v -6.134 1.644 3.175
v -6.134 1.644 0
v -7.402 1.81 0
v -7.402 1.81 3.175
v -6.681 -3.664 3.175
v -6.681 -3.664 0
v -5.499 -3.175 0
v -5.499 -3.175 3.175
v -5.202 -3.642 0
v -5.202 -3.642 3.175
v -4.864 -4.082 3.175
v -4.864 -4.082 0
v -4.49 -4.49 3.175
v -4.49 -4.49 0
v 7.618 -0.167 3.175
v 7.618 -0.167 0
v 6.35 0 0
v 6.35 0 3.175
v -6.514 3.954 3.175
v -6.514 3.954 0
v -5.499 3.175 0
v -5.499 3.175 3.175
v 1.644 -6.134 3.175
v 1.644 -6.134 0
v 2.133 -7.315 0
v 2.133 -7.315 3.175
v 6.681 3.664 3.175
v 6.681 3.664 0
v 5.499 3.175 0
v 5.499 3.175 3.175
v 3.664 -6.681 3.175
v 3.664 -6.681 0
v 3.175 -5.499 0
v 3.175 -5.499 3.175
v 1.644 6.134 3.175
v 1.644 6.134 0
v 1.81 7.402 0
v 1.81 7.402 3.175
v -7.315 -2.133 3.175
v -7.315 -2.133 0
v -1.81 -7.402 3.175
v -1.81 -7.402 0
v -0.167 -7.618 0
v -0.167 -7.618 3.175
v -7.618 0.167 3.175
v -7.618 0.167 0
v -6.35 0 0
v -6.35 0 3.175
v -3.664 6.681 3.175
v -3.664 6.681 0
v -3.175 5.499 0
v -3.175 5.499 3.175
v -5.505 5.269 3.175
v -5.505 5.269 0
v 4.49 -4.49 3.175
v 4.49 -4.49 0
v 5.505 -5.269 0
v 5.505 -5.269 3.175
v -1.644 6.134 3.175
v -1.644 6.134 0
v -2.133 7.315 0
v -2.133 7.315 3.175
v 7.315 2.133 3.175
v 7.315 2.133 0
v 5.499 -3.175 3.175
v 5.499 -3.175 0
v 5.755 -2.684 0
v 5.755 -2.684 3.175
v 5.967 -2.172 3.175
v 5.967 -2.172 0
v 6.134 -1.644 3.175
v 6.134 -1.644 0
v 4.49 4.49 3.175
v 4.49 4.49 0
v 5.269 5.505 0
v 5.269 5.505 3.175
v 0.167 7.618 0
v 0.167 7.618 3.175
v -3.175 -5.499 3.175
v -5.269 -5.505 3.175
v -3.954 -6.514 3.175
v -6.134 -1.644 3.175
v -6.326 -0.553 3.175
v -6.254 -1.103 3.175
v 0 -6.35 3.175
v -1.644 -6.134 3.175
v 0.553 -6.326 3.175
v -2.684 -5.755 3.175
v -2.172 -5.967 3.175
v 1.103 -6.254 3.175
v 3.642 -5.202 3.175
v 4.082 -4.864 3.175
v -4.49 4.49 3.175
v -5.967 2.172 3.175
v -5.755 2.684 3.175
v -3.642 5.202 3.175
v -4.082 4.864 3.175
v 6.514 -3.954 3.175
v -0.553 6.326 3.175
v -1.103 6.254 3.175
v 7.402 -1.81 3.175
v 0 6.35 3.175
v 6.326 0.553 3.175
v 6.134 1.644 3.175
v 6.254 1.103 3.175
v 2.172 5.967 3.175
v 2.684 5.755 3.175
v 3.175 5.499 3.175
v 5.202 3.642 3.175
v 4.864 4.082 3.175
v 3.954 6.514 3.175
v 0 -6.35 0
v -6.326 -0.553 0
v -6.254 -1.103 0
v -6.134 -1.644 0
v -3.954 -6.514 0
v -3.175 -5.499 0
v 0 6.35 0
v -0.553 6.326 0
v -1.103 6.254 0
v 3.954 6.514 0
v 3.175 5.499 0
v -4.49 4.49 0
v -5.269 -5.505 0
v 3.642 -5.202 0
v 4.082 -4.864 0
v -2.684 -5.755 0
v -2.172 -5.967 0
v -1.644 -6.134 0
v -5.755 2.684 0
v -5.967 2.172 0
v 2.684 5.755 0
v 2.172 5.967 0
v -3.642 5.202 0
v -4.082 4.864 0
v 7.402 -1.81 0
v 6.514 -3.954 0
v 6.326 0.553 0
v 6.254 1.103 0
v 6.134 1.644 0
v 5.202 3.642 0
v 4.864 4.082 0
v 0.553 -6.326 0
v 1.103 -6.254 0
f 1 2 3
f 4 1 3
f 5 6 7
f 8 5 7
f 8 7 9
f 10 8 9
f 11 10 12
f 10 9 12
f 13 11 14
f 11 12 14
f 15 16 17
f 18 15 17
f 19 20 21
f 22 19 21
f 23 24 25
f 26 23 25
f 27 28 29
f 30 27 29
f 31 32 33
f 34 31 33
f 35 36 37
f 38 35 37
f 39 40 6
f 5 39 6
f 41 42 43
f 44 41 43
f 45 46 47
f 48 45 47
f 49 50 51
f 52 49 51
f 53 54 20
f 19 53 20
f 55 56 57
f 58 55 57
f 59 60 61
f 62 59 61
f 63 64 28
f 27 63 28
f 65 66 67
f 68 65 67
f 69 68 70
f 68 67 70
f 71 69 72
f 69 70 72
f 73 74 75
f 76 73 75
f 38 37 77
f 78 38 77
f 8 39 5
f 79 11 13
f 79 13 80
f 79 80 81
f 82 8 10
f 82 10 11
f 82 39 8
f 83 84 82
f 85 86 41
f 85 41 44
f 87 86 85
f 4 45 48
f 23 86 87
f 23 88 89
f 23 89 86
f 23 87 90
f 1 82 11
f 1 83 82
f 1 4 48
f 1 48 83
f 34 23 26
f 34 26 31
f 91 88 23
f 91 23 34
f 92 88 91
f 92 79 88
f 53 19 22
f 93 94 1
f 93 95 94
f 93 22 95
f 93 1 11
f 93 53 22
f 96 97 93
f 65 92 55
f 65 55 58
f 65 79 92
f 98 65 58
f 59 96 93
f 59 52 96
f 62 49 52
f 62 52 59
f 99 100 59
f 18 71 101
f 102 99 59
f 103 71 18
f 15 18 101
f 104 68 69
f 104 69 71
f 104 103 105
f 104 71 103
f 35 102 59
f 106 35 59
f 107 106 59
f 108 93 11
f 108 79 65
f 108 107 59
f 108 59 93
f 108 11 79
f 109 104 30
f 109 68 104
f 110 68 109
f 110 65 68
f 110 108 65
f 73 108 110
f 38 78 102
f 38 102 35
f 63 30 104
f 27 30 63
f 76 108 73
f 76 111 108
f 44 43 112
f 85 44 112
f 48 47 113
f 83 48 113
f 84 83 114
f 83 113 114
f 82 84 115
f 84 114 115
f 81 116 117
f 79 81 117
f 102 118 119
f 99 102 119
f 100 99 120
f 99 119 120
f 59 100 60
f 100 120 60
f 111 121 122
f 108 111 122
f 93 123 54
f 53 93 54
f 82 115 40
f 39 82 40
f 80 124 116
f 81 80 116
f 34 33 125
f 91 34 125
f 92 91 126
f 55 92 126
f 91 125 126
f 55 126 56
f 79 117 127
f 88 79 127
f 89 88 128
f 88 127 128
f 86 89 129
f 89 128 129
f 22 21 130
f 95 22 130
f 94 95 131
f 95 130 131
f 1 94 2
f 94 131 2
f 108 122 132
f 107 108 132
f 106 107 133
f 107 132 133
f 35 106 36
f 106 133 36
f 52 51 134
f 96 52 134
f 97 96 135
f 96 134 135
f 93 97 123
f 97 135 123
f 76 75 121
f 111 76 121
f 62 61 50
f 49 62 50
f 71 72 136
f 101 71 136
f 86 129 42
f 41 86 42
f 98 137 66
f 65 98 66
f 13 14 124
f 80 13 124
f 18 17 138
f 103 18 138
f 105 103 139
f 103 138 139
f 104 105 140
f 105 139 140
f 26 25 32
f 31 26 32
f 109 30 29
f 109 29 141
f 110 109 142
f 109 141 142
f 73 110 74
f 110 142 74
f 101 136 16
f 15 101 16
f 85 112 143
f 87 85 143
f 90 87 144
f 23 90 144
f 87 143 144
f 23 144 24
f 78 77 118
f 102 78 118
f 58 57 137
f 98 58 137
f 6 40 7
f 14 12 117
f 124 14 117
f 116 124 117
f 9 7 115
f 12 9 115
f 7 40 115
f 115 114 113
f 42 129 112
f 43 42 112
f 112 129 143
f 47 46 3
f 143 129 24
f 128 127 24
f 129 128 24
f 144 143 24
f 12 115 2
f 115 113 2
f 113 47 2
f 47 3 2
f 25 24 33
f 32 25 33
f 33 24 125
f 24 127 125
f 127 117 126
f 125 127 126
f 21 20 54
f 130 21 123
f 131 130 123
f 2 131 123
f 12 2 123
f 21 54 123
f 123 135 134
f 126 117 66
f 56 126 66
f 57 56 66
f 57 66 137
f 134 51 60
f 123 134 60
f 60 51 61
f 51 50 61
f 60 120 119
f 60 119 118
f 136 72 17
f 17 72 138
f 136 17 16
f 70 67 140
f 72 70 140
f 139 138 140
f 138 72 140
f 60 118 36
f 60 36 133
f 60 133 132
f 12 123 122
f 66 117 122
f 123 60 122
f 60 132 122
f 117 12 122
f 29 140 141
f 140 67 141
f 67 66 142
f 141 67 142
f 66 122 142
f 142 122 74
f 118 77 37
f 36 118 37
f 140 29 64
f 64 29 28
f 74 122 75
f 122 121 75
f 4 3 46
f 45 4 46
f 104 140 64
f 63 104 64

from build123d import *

# Parameters (mm, degrees)
F1_DEPTH = 3.175
F2_COUNT = 12


# Not quite as in the source:
# - a length typed as a fraction of an inch, garbled in the dataset ("3 / 203.2 mm" for 3/8 in), is restored


with BuildPart() as f1:
    # F0 (on Top) → F1 (new body)
    with BuildSketch(Plane.XY):
        with BuildLine():
            ThreePointArc((0, 6.35), (-4.4901280605, -4.4901280605), (6.35, 0))
            ThreePointArc((6.35, 0), (5.0377937108, 3.8656350742), (1.6435009364, 6.1336289969))
            ThreePointArc((1.6435009364, 6.1336289969), (0.8288413206, 6.2956748697), (0, 6.35))
        make_face()
        with BuildLine():
            ThreePointArc((0, 6.35), (0.8288413206, 6.2956748697), (1.6435009364, 6.1336289969))
            Line((1.6435009364, 6.1336289969), (1.8104587787, 7.4017997143))
            Line((1.8104587787, 7.4017997143), (0.1669578423, 7.6181707174))
            Line((0.1669578423, 7.6181707174), (0, 6.35))
        make_face()
    extrude(amount=F1_DEPTH)

    # F2: F1 ×12 about axis
    f2_axis = Axis((0, 0, 0), (0, 0, -1))


with BuildPart() as f1_1:
    add(f1.part)
    for i in range(1, F2_COUNT):
        add(f1.part.rotate(f2_axis, i * 360 / F2_COUNT))


solid = f1_1.part
